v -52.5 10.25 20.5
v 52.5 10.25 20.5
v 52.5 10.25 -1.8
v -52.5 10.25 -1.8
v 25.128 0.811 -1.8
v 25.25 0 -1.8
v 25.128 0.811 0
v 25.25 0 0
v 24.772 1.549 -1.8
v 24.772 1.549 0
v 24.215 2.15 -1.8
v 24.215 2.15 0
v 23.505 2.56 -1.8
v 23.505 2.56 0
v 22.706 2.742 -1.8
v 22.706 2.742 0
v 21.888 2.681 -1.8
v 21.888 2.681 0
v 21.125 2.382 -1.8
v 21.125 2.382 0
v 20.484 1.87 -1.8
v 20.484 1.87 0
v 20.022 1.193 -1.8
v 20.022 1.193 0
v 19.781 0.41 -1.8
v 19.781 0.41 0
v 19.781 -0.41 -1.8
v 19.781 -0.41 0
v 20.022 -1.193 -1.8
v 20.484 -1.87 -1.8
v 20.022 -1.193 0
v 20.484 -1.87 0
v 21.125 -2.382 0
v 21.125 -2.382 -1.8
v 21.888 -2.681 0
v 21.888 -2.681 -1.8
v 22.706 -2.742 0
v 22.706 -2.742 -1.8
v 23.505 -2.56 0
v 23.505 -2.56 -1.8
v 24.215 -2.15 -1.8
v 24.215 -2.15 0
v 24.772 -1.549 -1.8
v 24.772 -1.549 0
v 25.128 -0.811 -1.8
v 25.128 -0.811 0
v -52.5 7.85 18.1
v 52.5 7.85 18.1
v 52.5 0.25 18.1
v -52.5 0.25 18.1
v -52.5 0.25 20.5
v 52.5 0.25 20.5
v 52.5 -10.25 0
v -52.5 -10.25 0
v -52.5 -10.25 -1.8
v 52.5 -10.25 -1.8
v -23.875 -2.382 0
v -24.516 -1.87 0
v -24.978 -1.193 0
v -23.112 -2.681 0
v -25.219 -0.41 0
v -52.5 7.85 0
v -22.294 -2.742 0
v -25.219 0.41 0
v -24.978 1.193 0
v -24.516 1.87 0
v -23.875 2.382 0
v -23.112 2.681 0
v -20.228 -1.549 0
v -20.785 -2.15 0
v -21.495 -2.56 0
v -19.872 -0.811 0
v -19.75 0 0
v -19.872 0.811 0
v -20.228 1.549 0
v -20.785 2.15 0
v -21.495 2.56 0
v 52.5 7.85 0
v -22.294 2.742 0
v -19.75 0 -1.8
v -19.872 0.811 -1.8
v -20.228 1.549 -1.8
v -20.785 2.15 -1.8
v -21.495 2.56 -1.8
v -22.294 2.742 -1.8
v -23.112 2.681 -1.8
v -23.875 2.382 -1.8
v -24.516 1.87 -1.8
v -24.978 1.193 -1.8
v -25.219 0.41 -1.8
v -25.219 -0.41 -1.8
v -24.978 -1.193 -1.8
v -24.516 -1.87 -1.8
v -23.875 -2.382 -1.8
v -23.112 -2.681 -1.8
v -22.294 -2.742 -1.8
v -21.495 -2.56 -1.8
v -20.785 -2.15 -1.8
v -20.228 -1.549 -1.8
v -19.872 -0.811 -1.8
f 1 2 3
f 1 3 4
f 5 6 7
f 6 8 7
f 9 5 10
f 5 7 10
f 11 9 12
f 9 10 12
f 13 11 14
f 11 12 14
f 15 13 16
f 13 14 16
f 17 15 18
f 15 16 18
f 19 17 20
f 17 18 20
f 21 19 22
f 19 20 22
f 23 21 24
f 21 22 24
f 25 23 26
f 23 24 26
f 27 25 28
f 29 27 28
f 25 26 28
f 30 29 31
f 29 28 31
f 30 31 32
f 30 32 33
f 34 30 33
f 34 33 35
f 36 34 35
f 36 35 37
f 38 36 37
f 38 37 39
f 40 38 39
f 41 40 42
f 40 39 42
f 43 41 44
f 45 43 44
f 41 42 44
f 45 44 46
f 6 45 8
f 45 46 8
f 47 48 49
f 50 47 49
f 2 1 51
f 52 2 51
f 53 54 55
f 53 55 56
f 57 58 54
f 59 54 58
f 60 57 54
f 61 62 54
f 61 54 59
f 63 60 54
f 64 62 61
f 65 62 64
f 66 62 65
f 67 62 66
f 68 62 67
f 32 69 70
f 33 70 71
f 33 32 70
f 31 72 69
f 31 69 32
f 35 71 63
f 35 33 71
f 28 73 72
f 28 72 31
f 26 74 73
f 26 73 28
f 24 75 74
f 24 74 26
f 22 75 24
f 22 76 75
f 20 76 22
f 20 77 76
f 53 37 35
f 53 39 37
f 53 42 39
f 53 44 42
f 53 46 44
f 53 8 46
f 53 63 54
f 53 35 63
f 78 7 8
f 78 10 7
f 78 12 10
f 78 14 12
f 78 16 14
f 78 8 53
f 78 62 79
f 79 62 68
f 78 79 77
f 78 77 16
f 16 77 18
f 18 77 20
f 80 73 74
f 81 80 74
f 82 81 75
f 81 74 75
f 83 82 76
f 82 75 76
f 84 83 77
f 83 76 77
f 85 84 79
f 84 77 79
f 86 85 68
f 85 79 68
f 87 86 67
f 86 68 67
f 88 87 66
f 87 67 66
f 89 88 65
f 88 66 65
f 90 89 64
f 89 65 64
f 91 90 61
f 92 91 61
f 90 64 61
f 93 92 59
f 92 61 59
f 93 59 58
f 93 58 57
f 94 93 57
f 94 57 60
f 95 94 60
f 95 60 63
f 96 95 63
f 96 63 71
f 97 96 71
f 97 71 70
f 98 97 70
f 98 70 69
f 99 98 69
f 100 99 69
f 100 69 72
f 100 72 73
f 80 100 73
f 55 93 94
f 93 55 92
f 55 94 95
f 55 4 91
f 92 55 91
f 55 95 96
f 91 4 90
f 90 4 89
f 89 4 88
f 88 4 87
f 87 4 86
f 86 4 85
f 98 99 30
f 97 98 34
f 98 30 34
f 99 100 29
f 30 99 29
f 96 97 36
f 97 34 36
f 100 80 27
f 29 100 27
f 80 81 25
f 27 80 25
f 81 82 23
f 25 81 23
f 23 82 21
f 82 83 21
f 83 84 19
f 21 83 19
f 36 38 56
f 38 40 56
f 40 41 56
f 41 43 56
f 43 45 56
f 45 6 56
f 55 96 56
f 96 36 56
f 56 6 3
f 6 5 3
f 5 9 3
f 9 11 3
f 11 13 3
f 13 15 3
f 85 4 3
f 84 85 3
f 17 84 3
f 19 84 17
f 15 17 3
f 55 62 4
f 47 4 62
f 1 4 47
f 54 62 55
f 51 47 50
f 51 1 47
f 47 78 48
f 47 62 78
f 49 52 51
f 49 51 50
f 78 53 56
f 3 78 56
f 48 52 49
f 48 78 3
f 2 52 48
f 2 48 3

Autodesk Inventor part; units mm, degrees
ref_plane "YZ Plane" through (0, 0, 0) normal (1, 0, 0) x (0, 1, 0)
ref_plane "XZ Plane" through (0, 0, 0) normal (0, 1, 0) x (-1, 0, 0)
ref_plane "XY Plane" through (0, 0, 0) normal (0, 0, 1) x (1, 0, 0)
sketch "Skizze1" plane through (0, 0, 0) normal (0, 0, 1) x (1, 0, 0)
  line L0 (-52.5, -10.25) -> (52.5, -10.25)
  line L1 (52.5, -10.25) -> (52.5, 10.25)
  line L2 (52.5, 10.25) -> (-52.5, 10.25)
  line L3 (-52.5, 10.25) -> (-52.5, -10.25)
  line L4 (-52.5, -10.25) -> (52.5, 10.25) construction
  line L5 (52.5, -10.25) -> (-52.5, 10.25) construction
  line L6 (-52.5, 0) -> (52.5, 0) construction
  circle A0 centre (-22.5, 0) radius 2.75
  circle A1 centre (22.5, 0) radius 2.75
  line L7 (0, -14.35) -> (0, 14.35) construction
  point P0 (0, 0)
  dimension "d0" = 105
  dimension "d1" = 20.5
  dimension "d2" = 5.5
  dimension "d3" = 5.5
  dimension "d4" = 45
sketch "Skizze2" plane through (0, 0, 0) normal (1, 0, 0) x (0, 1, 0)
  line L0 (-14.35, 0) -> (14.35, 0) construction
  line L1 (0.25, 0) -> (10.25, 0)
  line L2 (10.25, 0) -> (10.25, 20.5)
  line L3 (10.25, 20.5) -> (0.25, 20.5)
  line L4 (0.25, 20.5) -> (0.25, 0)
  line L5 (0.25, 0) -> (7.85, 0)
  line L6 (7.85, 0) -> (7.85, 18.1)
  line L7 (7.85, 18.1) -> (0.25, 18.1)
  line L8 (0.25, 18.1) -> (0.25, 0)
  point P0 (0, 0)
  point P1 (10.25, 0)
  point P2 (0.25, 18.1)
  dimension "d5" = 20.5
  dimension "d6" = 2.4
  dimension "d7" = 2.4
  dimension "d12" = 10
extrude "Extrusion1" add sketch "Skizze1" against normal blind 1.8
extrude "Extrusion2" add sketch "Skizze2" along normal mid plane 105 contours L6 L7 L4 L3 L2 L1
equation "\"d7\" = d6"
equation "\"d10\" = d0"
properties part number "Door_Handle" material "ABS-Kunststoff"
